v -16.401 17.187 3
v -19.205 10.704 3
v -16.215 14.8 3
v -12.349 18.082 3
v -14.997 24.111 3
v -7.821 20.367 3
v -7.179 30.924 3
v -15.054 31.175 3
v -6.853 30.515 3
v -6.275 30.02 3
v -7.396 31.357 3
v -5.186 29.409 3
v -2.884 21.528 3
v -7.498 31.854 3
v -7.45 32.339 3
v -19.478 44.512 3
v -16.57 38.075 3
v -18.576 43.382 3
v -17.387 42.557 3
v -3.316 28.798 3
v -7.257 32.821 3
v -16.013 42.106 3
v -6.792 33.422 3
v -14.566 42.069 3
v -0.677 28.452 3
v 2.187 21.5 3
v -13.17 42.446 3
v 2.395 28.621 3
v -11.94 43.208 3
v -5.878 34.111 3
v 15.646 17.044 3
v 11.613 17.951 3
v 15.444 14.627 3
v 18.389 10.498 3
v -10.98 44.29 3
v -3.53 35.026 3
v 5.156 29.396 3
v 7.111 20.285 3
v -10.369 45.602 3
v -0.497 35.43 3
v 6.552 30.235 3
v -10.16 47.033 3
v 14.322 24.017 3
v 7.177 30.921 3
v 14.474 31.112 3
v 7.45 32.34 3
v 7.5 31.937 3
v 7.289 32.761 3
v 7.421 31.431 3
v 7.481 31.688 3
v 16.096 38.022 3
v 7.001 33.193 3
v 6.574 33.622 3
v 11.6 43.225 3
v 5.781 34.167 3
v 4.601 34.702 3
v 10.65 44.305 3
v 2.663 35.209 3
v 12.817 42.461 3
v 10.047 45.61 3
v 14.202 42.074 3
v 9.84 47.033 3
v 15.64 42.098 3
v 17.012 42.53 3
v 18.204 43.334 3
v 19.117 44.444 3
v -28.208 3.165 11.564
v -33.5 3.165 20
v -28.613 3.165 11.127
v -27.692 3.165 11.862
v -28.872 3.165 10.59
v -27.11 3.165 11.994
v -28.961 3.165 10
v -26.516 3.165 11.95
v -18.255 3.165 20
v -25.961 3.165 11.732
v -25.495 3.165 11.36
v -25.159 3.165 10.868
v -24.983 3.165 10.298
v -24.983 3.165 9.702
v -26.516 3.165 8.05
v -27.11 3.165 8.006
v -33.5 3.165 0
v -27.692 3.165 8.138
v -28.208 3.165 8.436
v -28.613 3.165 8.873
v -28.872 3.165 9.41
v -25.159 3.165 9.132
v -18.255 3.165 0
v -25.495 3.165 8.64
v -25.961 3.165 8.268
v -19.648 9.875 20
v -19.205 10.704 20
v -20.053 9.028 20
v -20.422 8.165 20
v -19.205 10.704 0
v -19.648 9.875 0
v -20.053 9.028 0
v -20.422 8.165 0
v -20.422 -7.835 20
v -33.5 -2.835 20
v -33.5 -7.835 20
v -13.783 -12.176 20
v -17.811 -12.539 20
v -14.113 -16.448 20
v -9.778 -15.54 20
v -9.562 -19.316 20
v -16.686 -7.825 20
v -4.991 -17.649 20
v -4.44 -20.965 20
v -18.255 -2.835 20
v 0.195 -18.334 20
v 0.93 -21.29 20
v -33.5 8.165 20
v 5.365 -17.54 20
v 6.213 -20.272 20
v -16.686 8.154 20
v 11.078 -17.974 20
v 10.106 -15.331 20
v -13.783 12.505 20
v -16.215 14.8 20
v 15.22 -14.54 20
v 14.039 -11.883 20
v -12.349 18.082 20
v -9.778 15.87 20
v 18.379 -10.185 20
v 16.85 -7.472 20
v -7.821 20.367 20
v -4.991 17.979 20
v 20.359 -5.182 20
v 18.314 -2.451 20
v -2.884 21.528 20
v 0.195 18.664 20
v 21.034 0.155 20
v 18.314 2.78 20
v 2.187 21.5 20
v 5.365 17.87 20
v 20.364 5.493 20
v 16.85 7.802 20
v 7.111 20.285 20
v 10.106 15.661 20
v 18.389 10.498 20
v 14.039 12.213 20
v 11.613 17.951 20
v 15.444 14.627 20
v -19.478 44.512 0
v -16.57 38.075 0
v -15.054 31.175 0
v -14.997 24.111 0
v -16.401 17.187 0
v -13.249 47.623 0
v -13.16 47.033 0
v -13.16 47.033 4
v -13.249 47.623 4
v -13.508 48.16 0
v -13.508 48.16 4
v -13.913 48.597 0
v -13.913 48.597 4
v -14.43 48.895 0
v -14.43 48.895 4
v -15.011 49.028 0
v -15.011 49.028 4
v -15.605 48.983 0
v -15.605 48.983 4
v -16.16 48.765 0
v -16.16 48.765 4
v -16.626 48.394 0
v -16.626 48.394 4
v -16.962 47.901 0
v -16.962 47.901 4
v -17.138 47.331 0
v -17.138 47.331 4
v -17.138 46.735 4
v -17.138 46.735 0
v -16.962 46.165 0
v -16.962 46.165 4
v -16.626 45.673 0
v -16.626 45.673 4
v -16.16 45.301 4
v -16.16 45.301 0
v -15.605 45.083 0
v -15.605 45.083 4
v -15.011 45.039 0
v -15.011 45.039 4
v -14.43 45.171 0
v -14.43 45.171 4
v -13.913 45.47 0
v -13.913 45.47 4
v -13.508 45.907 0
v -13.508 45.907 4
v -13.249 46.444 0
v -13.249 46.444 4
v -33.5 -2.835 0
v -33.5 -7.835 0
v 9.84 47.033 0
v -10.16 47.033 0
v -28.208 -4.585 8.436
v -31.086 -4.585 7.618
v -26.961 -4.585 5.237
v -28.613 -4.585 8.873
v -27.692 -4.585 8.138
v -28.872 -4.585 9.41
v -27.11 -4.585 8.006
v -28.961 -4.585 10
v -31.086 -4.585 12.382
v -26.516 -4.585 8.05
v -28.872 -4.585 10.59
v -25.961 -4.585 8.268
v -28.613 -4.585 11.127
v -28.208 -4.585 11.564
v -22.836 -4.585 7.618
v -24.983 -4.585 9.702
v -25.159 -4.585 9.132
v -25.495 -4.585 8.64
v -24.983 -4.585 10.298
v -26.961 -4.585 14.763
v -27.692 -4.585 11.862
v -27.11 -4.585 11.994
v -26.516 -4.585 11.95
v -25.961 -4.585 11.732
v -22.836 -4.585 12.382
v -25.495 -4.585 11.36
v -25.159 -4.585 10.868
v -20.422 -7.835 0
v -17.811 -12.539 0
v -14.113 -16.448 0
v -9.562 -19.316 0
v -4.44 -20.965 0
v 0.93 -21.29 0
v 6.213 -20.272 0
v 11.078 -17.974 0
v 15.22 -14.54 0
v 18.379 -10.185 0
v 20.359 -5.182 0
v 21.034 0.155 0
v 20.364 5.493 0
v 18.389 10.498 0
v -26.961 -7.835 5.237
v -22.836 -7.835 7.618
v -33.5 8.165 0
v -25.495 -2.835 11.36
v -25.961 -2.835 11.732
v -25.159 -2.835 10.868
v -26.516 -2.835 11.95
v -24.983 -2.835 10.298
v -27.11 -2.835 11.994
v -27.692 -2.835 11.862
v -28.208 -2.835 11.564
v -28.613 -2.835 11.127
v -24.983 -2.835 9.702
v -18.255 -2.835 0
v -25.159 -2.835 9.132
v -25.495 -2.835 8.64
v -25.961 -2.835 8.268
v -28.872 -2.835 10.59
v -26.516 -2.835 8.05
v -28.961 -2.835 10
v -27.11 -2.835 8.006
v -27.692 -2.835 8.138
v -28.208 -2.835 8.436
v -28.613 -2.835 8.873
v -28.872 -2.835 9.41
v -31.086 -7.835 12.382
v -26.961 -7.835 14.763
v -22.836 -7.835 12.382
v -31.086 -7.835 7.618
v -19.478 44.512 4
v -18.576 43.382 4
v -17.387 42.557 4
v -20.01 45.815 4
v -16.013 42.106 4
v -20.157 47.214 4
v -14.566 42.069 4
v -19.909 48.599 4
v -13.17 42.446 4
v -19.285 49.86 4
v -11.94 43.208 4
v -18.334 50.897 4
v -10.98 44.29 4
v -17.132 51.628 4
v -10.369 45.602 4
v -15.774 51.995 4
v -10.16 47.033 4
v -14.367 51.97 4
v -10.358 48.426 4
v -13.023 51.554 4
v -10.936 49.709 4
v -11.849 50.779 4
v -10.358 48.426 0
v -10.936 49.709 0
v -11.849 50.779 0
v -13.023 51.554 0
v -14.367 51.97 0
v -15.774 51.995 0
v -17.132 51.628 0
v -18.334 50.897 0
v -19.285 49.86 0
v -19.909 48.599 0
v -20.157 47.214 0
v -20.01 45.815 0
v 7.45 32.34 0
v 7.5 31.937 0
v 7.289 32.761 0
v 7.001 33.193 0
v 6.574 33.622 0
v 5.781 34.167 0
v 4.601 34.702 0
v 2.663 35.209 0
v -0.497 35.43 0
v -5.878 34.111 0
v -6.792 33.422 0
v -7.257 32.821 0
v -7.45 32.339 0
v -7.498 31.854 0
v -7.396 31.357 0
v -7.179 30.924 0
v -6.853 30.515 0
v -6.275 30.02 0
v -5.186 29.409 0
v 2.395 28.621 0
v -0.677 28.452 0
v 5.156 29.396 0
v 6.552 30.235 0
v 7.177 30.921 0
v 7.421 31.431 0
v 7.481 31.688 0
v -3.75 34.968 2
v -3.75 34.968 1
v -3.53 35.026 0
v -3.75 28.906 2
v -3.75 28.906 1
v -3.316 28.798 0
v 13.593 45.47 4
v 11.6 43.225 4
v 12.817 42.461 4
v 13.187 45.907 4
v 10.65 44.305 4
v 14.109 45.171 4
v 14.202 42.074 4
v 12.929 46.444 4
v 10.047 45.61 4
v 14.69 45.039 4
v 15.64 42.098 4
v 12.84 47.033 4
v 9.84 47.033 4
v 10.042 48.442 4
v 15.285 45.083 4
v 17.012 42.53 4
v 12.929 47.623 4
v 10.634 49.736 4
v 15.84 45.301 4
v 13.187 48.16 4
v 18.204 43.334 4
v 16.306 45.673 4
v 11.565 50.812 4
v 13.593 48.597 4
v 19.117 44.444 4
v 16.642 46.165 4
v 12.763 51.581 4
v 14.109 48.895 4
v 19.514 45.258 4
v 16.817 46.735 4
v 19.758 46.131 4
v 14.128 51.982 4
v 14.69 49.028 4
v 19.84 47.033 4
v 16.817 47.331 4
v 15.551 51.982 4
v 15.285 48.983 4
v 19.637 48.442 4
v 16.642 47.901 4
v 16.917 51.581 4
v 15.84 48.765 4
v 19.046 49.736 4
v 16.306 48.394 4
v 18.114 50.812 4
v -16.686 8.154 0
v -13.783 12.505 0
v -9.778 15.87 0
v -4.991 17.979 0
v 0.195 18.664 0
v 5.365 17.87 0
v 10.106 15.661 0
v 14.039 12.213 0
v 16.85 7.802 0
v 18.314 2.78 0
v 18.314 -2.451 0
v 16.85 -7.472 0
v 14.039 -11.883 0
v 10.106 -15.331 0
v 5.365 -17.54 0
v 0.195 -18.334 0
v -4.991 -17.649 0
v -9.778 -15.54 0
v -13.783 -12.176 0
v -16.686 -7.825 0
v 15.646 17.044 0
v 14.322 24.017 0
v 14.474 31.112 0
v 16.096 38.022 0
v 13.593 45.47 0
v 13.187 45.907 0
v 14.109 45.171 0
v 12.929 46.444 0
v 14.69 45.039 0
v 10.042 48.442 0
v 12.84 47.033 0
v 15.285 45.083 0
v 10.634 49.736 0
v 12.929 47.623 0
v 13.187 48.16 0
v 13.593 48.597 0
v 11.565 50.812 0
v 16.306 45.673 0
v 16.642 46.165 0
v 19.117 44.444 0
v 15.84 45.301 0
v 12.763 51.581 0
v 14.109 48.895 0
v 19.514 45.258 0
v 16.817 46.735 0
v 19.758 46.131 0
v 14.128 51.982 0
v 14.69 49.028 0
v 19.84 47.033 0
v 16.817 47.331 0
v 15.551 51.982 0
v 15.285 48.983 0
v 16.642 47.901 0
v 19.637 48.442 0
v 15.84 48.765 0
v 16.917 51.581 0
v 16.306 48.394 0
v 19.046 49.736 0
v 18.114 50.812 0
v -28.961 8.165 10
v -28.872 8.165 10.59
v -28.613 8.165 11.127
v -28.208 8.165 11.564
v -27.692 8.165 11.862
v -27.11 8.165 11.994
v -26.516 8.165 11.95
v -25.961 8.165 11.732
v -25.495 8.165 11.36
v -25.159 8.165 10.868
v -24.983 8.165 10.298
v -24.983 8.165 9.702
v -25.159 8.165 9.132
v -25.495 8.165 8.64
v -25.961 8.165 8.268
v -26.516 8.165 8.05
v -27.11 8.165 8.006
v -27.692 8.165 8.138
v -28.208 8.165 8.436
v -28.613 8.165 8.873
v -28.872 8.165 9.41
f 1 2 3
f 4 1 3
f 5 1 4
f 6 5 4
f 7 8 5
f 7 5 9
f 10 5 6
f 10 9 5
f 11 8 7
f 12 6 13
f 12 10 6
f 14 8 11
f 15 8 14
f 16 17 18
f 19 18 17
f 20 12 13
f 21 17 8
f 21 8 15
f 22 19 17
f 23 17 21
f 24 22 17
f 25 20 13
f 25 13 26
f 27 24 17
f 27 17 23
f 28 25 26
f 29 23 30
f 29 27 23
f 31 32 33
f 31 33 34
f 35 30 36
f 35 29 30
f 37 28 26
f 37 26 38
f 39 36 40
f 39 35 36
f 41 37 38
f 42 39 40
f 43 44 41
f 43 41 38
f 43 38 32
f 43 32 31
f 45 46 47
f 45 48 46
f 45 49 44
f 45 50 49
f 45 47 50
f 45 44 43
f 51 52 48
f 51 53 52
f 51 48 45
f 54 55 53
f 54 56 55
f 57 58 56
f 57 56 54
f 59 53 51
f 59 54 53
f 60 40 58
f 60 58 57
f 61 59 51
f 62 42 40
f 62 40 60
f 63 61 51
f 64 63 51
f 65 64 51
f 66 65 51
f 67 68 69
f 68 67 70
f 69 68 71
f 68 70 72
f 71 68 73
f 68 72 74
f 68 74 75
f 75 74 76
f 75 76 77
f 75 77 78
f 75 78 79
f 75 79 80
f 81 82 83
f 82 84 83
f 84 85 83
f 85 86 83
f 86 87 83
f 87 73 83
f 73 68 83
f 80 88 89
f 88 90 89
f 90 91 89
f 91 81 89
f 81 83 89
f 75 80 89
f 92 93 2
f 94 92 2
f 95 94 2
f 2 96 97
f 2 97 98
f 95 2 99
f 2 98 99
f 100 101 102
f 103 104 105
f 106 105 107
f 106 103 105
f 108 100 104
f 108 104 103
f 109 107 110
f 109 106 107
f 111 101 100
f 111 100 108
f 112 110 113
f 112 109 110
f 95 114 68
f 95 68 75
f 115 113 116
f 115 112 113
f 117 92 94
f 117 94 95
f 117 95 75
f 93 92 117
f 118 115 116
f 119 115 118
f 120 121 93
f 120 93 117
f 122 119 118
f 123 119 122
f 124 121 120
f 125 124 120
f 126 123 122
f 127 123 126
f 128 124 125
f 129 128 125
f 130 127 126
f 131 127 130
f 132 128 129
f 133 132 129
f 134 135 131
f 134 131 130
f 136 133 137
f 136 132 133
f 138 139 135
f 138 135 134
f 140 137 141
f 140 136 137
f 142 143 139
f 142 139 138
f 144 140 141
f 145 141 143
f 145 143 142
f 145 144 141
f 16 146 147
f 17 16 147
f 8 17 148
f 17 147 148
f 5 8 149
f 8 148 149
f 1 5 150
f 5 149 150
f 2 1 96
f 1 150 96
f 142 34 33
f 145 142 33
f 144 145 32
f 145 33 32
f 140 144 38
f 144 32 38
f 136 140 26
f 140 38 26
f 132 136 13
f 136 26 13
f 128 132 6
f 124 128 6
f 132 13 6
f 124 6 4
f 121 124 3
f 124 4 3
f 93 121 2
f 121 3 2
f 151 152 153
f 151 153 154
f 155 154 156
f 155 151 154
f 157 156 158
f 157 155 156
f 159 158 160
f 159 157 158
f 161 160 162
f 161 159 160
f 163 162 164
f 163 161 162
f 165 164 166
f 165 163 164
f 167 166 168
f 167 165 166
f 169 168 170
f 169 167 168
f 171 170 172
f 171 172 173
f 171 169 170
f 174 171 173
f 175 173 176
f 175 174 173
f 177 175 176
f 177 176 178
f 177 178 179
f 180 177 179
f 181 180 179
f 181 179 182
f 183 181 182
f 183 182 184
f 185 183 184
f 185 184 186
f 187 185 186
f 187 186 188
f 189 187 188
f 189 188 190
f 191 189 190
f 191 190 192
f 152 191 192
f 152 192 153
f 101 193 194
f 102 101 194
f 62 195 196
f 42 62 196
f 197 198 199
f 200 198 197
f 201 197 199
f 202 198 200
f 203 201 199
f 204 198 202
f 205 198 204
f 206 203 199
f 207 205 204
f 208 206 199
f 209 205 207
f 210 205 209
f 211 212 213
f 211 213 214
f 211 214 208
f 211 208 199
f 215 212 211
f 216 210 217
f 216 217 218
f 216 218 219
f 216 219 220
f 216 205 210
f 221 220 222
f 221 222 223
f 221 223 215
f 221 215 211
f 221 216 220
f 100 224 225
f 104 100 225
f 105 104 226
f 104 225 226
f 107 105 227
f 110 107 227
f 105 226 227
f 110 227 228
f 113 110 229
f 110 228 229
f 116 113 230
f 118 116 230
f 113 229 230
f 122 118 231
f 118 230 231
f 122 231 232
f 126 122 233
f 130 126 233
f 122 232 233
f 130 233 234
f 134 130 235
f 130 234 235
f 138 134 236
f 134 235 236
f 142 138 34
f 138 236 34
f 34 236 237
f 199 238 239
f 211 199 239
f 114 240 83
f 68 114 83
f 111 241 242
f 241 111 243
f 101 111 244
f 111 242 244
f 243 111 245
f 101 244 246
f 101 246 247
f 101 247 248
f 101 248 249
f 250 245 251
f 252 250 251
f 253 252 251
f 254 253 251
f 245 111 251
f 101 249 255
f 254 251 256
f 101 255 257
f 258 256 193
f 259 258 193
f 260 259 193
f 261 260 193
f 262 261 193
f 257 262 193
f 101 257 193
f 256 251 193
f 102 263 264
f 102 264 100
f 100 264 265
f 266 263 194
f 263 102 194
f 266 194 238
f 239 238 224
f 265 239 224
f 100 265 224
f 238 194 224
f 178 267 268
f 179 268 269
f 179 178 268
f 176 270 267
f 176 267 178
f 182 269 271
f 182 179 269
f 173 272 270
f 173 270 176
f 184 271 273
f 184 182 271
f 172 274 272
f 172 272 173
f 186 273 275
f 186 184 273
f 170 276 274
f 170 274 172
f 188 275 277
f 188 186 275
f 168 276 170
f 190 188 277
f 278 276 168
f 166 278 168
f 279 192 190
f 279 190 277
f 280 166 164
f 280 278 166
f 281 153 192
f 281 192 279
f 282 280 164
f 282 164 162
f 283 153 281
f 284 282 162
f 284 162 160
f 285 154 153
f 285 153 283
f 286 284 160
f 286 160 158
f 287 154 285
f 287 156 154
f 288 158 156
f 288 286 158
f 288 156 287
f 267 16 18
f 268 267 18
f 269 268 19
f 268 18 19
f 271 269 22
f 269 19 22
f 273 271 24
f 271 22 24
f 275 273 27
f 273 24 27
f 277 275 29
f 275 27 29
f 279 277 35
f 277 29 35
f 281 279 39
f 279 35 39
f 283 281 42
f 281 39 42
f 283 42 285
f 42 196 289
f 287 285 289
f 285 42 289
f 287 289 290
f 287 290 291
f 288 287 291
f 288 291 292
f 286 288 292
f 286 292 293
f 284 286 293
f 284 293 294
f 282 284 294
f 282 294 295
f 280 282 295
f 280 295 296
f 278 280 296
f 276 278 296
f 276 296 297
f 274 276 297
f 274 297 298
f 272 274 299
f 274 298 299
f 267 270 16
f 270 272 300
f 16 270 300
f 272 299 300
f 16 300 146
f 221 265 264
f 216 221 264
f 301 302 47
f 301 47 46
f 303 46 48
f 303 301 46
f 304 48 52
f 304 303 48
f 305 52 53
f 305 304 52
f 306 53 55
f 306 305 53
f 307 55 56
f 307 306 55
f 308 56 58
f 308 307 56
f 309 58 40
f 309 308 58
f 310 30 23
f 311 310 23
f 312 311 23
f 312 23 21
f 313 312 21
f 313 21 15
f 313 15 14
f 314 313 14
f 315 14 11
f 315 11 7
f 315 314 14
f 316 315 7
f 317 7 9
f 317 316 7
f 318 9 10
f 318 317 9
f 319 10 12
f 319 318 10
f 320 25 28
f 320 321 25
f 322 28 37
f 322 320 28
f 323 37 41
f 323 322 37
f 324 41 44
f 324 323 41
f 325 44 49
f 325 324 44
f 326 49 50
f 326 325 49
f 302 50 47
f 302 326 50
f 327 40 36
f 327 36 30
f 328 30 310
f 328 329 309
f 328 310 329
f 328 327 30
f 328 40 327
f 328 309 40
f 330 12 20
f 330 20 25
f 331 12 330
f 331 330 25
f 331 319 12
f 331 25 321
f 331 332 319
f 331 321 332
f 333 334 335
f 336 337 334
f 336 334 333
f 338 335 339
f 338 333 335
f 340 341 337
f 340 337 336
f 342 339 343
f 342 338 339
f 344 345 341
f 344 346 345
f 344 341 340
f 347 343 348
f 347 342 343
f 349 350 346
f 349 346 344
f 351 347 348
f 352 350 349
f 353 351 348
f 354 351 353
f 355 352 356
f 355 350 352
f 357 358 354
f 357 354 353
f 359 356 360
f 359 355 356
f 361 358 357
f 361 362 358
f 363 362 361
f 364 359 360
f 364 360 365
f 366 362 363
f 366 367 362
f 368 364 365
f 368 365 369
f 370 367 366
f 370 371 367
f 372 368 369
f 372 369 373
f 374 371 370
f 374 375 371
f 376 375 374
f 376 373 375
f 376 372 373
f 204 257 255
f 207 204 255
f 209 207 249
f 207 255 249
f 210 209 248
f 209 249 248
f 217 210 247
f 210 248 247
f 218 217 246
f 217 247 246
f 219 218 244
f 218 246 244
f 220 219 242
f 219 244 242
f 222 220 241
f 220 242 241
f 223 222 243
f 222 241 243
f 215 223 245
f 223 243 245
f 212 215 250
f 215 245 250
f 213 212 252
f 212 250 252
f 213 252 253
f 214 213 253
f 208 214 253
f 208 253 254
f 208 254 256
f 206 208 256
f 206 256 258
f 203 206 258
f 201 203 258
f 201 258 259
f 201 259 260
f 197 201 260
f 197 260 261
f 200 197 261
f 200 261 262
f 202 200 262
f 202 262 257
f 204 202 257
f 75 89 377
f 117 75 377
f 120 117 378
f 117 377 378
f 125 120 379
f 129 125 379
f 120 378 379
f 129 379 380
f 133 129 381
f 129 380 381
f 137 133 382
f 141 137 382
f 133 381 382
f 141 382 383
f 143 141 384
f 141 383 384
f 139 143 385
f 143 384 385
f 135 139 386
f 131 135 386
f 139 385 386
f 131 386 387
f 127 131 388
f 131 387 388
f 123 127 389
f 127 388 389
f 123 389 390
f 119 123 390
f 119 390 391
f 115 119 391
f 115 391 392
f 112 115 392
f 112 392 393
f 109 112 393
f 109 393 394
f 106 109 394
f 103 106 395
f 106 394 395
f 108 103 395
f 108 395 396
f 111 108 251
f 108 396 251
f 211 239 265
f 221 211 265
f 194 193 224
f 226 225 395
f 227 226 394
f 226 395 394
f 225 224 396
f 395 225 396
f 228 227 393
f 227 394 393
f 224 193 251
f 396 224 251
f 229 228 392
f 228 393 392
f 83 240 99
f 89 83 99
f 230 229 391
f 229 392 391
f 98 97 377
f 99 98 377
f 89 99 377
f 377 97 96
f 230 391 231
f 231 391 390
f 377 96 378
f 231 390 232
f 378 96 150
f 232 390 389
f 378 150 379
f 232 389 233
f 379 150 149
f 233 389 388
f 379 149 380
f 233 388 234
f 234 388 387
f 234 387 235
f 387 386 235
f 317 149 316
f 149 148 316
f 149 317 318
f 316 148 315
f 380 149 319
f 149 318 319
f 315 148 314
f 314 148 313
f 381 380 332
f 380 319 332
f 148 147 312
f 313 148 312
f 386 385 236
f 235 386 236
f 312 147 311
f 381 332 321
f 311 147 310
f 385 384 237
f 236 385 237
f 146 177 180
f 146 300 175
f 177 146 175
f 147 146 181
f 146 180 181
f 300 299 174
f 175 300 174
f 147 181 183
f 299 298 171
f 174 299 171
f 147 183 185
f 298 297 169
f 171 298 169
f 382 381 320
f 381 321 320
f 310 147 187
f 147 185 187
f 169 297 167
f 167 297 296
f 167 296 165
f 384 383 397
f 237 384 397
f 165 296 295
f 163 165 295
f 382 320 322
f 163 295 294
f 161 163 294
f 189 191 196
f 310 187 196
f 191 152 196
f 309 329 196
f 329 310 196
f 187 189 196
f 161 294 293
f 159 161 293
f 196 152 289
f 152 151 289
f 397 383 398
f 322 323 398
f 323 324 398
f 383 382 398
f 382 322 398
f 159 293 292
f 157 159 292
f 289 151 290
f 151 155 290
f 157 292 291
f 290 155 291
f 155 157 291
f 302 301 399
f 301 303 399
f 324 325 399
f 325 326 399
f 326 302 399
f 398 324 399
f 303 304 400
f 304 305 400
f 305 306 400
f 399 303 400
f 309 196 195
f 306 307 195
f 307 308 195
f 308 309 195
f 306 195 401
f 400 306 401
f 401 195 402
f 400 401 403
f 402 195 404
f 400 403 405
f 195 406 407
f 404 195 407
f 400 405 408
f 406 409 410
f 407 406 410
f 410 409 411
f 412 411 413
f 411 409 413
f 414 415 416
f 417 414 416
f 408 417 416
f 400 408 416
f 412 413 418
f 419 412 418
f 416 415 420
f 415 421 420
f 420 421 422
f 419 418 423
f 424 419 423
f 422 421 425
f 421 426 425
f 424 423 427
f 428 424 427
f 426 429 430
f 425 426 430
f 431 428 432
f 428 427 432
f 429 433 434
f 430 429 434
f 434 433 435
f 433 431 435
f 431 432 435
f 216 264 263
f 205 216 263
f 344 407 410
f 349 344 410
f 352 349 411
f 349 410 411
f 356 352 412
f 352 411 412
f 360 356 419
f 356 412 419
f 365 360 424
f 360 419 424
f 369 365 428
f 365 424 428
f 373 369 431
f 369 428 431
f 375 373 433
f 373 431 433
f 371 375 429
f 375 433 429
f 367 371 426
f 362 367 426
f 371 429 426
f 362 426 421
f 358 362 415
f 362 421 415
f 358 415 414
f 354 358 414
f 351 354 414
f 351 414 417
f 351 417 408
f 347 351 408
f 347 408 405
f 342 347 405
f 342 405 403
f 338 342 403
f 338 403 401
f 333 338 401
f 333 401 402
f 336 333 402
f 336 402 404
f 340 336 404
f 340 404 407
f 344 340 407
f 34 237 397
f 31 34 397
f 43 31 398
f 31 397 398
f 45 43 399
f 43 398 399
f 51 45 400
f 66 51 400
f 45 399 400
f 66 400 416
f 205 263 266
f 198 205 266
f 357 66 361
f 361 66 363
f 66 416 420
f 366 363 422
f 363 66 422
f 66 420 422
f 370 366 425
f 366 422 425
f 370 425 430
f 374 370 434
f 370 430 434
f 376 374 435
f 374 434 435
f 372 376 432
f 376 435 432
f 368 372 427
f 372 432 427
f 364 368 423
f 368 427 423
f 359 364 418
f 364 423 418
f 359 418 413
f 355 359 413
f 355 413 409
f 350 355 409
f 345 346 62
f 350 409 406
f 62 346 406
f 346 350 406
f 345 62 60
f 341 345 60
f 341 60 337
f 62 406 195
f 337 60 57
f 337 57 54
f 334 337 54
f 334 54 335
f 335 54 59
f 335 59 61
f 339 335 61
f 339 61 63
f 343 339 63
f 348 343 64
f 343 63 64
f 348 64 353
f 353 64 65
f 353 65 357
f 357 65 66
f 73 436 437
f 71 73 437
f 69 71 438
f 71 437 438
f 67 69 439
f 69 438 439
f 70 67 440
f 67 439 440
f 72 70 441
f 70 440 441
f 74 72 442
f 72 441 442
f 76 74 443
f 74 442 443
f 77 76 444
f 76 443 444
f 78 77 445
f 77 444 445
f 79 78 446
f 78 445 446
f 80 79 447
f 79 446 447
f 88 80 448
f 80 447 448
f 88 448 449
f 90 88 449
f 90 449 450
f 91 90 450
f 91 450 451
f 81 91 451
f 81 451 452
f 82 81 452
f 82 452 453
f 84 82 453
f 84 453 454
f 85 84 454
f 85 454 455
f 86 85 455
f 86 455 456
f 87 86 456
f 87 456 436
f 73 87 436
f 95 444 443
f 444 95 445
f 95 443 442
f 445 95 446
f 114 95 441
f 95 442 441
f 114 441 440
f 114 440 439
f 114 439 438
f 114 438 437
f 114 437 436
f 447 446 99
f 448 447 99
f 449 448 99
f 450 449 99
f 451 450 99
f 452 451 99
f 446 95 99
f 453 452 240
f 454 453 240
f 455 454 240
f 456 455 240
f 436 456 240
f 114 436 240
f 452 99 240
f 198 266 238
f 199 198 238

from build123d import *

# Parameters (mm, degrees)
F1_DEPTH = 20
F0_R     = 2
F2_DEPTH = 3
F3_DEPTH = 4
F5_DEPTH = 3.25
F6_R     = 2
F7_DEPTH = 29.5010001


# Not quite as in the source:
# - a feature names something its author has since deleted; it is built from what else it names


with BuildPart() as f1:
    # F0 (on Top) → F1 (new body)
    with BuildSketch(Plane.XY):
        with BuildLine():
            ThreePointArc((-18.2551362635, 3.1646558729), (18.5, 0.1646558729), (-18.2551362635, -2.8353441271))
            Line((-18.2551362635, -2.8353441271), (-21.289668856, -2.8353441271))
            Line((-21.289668856, -2.8353441271), (-33.5, -2.8353441271))
            Line((-33.5, -2.8353441271), (-33.5, -5.8353441271))
            Line((-33.5, -5.8353441271), (-33.5, -7.8353441271))
            Line((-33.5, -7.8353441271), (-20.4217309456, -7.8353441271))
            ThreePointArc((-20.4217309456, -7.8353441271), (8.7176252261, -19.2755005117), (18.3885107603, 10.4978639134))
            ThreePointArc((18.3885107603, 10.4978639134), (-0.3478610365, 21.6643338769), (-19.2053350681, 10.7036152553))
            ThreePointArc((-19.2053350681, 10.7036152553), (-19.8551354356, 9.4540669672), (-20.4217309456, 8.1646558729))
            Line((-20.4217309456, 8.1646558729), (-33.5, 8.1646558729))
            Line((-33.5, 8.1646558729), (-33.5, 6.1646558729))
            Line((-33.5, 6.1646558729), (-33.5, 3.1646558729))
            Line((-33.5, 3.1646558729), (-21.289668856, 3.1646558729))
            Line((-21.289668856, 3.1646558729), (-18.2551362635, 3.1646558729))
        make_face()
    extrude(amount=F1_DEPTH)

    # F0 (on Top) → F2 (join)
    with BuildSketch(Plane.XY):
        with BuildLine():
            ThreePointArc((-19.2053350681, 10.7036152553), (-0.3478610365, 21.6643338769), (18.3885107603, 10.4978639134))
            ThreePointArc((18.3885107603, 10.4978639134), (14.2120337074, 27.5685018888), (19.1172770705, 44.4441716239))
            ThreePointArc((19.1172770705, 44.4441716239), (13.4958098431, 42.2172179553), (9.8397882001, 47.0332040616))
            Line((9.8397882001, 47.0332040616), (-10.1602117999, 47.0332040616))
            ThreePointArc((-10.1602117999, 47.0332040616), (-13.8544265436, 42.2067224379), (-19.4781817457, 44.512264644))
            ThreePointArc((-19.4781817457, 44.512264644), (-14.8414845345, 27.6442586076), (-19.2053350681, 10.7036152553))
        make_face()
        with BuildLine():
            add(Edge.make_bspline(
                [(7.5, 31.9373905659), (7.5, 37.9995683924), (-3.75, 34.9684794791), (-15, 31.9373905659), (-3.75, 28.9063016526), (7.5, 25.8752127394), (7.5, 31.9373905659)],
                knots=[0, 0, 0, 2.0943951024, 2.0943951024, 4.1887902048, 4.1887902048, 6.2831853072, 6.2831853072, 6.2831853072], degree=2, weights=[1, 0.5, 1, 0.5, 1, 0.5, 1]))
        make_face(mode=Mode.SUBTRACT)
        with BuildLine():
            ThreePointArc((-10.1602117999, 47.0332040616), (-16.4659970562, 51.8596856854), (-19.4781817457, 44.512264644))
            ThreePointArc((-19.4781817457, 44.512264644), (-13.8544265436, 42.2067224379), (-10.1602117999, 47.0332040616))
        make_face()
        with Locations((-15.1602117999, 47.0332040616)):
            Circle(F0_R, mode=Mode.SUBTRACT)
        with BuildLine():
            ThreePointArc((9.8397882001, 47.0332040616), (13.4958098431, 42.2172179553), (19.1172770705, 44.4441716239))
            ThreePointArc((19.1172770705, 44.4441716239), (19.6557743064, 45.6892257046), (19.8397882001, 47.0332040616))
            ThreePointArc((19.8397882001, 47.0332040616), (14.8397882001, 52.0332040616), (9.8397882001, 47.0332040616))
        make_face()
        with BuildLine():
            ThreePointArc((16.8397882001, 47.0332040616), (14.8397882001, 45.0332040616), (12.8397882001, 47.0332040616))
            ThreePointArc((12.8397882001, 47.0332040616), (14.8397882001, 49.0332040616), (16.8397882001, 47.0332040616))
        make_face(mode=Mode.SUBTRACT)
    extrude(amount=F2_DEPTH)

    # F0 (on Top) → F3 (join)
    with BuildSketch(Plane.XY):
        with BuildLine():
            ThreePointArc((-10.1602117999, 47.0332040616), (-16.4659970562, 51.8596856854), (-19.4781817457, 44.512264644))
            ThreePointArc((-19.4781817457, 44.512264644), (-13.8544265436, 42.2067224379), (-10.1602117999, 47.0332040616))
        make_face()
        with Locations((-15.1602117999, 47.0332040616)):
            Circle(F0_R, mode=Mode.SUBTRACT)
        with BuildLine():
            ThreePointArc((9.8397882001, 47.0332040616), (13.4958098431, 42.2172179553), (19.1172770705, 44.4441716239))
            ThreePointArc((19.1172770705, 44.4441716239), (19.6557743064, 45.6892257046), (19.8397882001, 47.0332040616))
            ThreePointArc((19.8397882001, 47.0332040616), (14.8397882001, 52.0332040616), (9.8397882001, 47.0332040616))
        make_face()
        with BuildLine():
            ThreePointArc((16.8397882001, 47.0332040616), (14.8397882001, 45.0332040616), (12.8397882001, 47.0332040616))
            ThreePointArc((12.8397882001, 47.0332040616), (14.8397882001, 49.0332040616), (16.8397882001, 47.0332040616))
        make_face(mode=Mode.SUBTRACT)
    extrude(amount=F3_DEPTH)

    # F4 (on face) → F5 (cut)
    with BuildSketch(Plane.XZ.offset(7.8353441271)):
        Polygon((-31.0858654728, 12.3815698604), (-31.0858654728, 7.6184301396), (-26.9608654728, 5.2368602792), (-22.8358654728, 7.6184301396), (-22.8358654728, 12.3815698604), (-26.9608654728, 14.7631397208), align=None)
    extrude(amount=-F5_DEPTH, mode=Mode.SUBTRACT)

    # F6 (on face) → F7 (cut, through all)
    with BuildSketch(Plane(origin=(0, 8.1646558729, 0), x_dir=(-1, 0, 0), z_dir=(0, 1, 0))):
        with Locations((26.9608654728, 10)):
            Circle(F6_R)
    extrude(amount=-F7_DEPTH, mode=Mode.SUBTRACT)


solid = f1.part
